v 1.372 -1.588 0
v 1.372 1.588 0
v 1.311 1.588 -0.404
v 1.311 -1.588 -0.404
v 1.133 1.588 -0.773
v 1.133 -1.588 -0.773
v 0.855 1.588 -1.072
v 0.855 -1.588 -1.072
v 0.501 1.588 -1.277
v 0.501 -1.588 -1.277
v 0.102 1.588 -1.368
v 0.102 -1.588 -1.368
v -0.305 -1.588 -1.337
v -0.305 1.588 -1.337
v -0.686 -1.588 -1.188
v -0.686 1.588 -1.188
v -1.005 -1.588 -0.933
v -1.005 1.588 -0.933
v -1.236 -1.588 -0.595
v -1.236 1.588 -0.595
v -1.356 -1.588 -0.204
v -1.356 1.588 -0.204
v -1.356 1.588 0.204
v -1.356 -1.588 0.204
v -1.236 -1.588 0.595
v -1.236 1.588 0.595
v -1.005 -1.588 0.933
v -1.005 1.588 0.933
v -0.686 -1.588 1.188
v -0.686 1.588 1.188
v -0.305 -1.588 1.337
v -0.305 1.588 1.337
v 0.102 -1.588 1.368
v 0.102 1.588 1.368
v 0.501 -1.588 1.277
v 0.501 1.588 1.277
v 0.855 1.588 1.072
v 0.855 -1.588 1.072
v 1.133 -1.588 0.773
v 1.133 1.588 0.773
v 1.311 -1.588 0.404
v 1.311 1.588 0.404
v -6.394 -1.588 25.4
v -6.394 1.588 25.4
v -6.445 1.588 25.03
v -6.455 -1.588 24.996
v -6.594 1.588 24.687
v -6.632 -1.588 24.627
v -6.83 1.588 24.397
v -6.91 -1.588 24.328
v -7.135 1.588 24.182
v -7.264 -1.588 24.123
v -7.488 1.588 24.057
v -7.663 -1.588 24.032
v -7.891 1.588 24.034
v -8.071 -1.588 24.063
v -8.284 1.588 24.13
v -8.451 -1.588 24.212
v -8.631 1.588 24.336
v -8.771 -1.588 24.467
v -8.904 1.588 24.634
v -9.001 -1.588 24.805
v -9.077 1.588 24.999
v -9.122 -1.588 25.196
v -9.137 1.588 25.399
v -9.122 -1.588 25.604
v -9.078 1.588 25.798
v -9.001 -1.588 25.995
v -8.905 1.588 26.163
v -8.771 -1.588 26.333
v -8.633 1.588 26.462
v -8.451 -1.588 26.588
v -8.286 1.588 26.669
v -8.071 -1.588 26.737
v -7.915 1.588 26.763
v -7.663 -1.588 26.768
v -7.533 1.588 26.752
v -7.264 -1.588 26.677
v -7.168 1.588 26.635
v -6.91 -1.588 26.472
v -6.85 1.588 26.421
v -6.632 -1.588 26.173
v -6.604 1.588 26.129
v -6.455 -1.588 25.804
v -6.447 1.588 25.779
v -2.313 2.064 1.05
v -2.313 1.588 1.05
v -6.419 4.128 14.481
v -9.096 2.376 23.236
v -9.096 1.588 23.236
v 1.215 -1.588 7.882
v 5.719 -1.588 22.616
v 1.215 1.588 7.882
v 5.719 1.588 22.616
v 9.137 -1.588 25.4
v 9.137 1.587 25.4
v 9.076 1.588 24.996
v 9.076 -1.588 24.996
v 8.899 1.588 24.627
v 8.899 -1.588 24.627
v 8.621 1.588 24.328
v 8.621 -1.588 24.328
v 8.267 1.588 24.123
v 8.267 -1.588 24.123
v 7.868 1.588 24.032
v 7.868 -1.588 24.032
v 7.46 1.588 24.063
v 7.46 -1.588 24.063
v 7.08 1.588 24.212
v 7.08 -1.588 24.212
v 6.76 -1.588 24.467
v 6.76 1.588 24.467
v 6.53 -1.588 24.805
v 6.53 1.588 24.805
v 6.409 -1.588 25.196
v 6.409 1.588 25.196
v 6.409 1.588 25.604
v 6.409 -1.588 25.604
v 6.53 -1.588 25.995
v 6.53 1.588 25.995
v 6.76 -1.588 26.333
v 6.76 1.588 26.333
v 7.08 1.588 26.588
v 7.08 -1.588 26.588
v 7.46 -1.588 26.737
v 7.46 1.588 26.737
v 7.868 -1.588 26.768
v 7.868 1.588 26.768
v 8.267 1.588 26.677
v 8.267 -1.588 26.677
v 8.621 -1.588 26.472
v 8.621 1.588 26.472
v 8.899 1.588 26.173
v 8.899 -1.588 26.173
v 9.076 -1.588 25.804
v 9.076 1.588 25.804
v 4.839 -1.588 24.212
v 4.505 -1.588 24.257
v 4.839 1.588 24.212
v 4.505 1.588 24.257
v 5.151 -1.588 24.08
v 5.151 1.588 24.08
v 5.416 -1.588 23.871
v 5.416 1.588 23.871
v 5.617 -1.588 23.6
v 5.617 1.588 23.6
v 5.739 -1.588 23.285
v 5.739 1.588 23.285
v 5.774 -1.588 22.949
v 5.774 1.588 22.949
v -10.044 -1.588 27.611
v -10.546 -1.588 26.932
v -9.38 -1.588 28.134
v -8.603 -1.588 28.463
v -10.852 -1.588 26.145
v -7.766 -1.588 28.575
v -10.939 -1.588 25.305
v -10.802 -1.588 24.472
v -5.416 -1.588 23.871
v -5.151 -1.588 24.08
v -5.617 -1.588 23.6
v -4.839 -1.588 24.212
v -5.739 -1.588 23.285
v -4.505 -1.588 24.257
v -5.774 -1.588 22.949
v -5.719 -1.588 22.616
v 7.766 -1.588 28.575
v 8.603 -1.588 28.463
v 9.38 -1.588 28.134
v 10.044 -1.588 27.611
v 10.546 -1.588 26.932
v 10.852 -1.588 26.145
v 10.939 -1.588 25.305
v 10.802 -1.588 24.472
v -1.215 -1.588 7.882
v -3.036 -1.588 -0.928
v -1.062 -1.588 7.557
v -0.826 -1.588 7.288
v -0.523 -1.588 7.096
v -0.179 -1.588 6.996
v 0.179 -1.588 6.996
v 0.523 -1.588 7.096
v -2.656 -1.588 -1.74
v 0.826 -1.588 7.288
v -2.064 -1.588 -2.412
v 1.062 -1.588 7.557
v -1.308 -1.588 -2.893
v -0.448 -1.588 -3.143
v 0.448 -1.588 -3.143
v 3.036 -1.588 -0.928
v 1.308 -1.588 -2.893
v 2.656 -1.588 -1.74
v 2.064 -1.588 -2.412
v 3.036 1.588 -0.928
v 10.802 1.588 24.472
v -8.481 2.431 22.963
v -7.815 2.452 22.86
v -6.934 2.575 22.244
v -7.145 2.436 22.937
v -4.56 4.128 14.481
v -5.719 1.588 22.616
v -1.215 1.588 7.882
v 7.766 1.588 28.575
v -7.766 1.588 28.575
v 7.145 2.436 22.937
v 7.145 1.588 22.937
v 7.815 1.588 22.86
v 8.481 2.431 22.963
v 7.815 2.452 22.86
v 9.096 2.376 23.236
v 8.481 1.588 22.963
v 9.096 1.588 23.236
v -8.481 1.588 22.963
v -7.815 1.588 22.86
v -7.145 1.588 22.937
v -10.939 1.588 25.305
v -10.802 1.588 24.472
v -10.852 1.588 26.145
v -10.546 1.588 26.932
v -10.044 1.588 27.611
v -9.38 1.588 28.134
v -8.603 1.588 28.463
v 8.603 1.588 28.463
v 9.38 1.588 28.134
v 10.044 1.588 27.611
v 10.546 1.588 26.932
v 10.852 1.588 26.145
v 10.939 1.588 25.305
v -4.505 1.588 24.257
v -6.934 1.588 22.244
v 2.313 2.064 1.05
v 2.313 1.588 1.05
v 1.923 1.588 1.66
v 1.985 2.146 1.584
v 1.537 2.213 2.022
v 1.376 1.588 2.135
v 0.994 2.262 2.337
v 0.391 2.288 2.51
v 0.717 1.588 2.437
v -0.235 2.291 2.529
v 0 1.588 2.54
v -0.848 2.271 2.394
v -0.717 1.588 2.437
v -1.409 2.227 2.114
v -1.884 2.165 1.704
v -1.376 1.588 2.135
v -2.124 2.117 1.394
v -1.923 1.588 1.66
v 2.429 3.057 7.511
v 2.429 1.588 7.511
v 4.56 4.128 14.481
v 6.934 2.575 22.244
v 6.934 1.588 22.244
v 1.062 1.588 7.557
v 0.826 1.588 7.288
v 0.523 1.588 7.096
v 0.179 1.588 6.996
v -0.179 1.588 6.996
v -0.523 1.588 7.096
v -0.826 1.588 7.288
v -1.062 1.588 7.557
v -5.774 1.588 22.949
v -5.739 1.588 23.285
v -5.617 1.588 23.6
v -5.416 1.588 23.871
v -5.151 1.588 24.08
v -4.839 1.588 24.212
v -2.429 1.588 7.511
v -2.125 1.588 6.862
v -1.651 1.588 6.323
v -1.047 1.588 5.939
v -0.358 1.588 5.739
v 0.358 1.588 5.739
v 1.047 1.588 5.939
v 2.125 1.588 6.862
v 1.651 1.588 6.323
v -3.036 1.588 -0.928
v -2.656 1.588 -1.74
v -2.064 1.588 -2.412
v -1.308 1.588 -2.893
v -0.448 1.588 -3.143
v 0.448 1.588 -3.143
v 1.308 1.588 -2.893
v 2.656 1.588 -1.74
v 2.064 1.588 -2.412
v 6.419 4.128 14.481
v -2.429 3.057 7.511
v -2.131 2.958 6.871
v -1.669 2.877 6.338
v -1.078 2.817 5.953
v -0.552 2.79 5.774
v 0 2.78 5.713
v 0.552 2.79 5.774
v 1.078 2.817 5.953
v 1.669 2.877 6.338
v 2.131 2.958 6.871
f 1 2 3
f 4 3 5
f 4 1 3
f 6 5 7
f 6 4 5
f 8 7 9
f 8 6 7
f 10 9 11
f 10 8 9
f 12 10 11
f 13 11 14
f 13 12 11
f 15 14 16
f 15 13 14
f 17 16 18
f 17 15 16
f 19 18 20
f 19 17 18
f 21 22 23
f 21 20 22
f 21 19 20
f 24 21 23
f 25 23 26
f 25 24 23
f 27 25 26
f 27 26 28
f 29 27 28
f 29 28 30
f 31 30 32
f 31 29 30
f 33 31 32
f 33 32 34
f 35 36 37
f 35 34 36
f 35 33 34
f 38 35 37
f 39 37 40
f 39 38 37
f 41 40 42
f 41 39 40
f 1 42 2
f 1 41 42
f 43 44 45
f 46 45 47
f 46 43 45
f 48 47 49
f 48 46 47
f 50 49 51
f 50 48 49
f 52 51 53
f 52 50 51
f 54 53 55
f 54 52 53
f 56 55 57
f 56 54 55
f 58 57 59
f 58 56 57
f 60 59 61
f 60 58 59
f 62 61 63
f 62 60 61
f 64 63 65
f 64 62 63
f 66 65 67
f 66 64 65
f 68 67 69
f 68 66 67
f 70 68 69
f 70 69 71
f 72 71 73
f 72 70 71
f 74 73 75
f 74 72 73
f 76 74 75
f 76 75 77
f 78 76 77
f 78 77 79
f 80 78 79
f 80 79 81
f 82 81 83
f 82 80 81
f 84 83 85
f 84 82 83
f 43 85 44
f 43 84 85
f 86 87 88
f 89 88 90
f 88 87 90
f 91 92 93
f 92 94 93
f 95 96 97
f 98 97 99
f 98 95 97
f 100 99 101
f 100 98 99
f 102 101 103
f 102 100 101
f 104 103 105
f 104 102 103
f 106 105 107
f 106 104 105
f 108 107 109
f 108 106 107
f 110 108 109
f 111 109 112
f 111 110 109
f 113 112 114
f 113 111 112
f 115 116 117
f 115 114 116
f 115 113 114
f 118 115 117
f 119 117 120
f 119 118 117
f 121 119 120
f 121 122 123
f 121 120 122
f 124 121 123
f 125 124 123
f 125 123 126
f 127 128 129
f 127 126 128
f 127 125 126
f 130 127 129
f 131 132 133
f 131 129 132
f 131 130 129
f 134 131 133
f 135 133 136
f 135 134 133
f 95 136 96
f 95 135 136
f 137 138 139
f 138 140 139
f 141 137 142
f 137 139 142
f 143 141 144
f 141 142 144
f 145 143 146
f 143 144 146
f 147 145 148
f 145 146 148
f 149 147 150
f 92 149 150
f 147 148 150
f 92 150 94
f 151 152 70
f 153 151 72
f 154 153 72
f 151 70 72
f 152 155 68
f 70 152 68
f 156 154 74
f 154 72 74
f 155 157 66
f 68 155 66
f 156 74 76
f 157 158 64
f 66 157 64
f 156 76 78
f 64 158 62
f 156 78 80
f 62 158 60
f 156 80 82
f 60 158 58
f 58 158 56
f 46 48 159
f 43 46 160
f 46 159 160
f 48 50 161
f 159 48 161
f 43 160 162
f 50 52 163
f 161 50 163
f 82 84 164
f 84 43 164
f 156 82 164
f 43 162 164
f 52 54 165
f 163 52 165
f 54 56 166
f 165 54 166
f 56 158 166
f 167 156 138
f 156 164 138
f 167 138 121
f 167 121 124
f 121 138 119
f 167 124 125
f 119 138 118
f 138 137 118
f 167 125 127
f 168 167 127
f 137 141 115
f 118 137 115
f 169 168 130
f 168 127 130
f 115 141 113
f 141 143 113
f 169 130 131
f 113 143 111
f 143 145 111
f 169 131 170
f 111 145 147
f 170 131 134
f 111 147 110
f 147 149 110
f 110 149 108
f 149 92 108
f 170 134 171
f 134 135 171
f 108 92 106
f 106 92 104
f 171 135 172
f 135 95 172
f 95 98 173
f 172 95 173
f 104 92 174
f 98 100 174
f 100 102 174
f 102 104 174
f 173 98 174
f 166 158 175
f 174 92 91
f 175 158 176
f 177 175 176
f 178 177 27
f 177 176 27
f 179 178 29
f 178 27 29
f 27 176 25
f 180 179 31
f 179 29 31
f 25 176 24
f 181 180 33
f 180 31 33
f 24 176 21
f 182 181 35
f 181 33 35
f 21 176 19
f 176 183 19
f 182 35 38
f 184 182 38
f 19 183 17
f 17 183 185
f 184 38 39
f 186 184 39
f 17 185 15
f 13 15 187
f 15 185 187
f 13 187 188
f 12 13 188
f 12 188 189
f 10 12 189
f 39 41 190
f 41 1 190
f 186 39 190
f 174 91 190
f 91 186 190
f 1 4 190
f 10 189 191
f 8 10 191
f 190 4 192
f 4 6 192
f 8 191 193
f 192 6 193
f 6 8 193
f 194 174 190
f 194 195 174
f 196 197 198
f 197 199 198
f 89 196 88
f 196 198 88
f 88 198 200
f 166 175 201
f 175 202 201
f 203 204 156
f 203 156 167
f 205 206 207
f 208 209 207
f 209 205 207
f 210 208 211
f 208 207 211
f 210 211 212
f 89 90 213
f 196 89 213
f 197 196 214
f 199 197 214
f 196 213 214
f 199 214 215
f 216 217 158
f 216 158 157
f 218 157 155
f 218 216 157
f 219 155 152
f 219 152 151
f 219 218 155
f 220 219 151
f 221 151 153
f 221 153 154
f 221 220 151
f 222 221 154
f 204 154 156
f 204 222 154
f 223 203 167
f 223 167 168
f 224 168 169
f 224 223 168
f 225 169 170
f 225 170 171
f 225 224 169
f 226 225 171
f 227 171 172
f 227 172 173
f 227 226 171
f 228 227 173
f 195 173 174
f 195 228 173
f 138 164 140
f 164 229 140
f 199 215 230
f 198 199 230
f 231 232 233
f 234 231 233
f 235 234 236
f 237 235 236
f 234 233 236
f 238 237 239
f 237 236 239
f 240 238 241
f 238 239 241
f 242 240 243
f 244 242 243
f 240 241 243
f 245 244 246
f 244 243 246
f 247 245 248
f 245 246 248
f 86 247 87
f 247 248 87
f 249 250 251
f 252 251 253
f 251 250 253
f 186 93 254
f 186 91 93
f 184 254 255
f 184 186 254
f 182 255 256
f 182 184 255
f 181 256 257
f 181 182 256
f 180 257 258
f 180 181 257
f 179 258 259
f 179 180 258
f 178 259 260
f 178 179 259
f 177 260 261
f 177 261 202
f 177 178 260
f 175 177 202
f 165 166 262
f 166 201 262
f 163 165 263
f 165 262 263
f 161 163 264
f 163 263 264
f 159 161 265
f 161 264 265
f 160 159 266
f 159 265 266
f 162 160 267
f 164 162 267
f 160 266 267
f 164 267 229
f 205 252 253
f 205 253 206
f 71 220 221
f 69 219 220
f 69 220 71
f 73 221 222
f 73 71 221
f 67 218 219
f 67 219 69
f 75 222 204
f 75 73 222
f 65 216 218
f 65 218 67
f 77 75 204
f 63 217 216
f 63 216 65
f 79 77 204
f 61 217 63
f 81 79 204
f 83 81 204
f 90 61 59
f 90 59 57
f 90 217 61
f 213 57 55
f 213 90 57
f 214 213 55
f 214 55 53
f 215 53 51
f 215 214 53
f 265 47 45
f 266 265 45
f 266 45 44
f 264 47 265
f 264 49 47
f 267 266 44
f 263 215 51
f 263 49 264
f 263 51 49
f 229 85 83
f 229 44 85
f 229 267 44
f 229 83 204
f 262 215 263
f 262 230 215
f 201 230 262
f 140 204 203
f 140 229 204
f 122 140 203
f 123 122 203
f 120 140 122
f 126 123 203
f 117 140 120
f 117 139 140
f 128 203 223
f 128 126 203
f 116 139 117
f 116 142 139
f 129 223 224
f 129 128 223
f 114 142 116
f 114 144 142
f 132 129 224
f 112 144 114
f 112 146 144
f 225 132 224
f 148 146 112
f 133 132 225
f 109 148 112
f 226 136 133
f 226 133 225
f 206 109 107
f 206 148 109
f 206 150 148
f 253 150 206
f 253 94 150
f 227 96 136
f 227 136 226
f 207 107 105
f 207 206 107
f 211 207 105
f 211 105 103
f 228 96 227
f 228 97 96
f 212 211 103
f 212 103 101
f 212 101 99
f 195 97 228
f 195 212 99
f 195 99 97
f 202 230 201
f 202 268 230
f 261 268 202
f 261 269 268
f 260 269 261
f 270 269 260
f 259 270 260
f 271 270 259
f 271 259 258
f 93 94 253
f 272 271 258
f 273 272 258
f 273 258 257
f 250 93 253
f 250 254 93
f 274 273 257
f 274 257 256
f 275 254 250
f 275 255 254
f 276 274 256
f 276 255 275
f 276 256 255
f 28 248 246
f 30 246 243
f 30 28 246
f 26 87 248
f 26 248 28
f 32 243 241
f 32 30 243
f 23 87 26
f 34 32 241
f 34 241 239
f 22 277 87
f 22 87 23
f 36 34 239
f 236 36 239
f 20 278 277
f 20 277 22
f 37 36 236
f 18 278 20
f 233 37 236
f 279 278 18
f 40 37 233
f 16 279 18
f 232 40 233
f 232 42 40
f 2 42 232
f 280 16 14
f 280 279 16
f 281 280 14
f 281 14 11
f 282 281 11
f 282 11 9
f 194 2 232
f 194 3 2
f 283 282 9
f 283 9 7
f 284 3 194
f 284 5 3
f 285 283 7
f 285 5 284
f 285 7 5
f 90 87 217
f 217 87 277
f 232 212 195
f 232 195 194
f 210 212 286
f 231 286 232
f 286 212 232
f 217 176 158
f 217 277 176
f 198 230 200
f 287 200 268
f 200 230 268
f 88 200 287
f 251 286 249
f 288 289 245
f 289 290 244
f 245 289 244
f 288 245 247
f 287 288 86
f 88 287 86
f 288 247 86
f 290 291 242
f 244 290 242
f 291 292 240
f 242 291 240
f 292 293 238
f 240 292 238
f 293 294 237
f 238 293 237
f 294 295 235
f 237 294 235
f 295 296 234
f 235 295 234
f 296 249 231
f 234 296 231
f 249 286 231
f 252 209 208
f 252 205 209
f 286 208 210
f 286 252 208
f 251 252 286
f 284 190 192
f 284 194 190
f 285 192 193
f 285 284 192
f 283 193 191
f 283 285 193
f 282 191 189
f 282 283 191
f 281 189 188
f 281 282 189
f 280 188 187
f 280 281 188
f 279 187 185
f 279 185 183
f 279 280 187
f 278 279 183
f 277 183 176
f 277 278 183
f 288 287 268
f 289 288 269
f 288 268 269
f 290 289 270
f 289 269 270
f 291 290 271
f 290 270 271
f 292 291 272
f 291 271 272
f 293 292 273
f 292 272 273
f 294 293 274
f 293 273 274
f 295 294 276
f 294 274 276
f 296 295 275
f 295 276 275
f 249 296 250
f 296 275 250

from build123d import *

# Parameters (mm, degrees)
SKETCH1_R        = 1.3716
BODY_DEPTH       = 1.5875
SKETCH2_R        = 1.3716
RIB_DEPTH        = 3.175
ANGLE_DEPTH      = 11.940559309
ANGLE_DEPTH_BACK = 11.940559309
BOLT_START       = -3.175
SKETCH5_R        = 2.54
BOLT_HOLE_DEPTH  = 2.54


with BuildPart() as part:
    # Sketch1 → Body (new body, symmetric)
    with BuildSketch(Plane(origin=(0, 0, 0), x_dir=(1, 0, 0), z_dir=(0, 1, 0))):
        with BuildLine():
            Line((-3.0362676, 0.928280162), (-10.801826909, -24.471719838))
            ThreePointArc((-10.801826909, -24.471719838), (-10.317804842, -27.288562348), (-7.765559309, -28.575))
            Line((-7.765559309, -28.575), (7.765559309, -28.575))
            ThreePointArc((7.765559309, -28.575), (10.317804842, -27.288562348), (10.801826909, -24.471719838))
            Line((10.801826909, -24.471719838), (3.0362676, 0.928280162))
            ThreePointArc((3.0362676, 0.928280162), (0, 3.175), (-3.0362676, 0.928280162))
        make_face()
        Circle(SKETCH1_R, mode=Mode.SUBTRACT)
        with Locations((-7.765559309, -25.4)):
            Circle(SKETCH1_R, mode=Mode.SUBTRACT)
        with Locations((7.765559309, -25.4)):
            Circle(SKETCH1_R, mode=Mode.SUBTRACT)
        with BuildLine():
            Line((-1.21450704, -7.88188057), (-5.719084006, -22.615687935))
            ThreePointArc((-5.719084006, -22.615687935), (-5.525475179, -23.742424939), (-4.504576966, -24.257))
            Line((-4.504576966, -24.257), (4.504576966, -24.257))
            ThreePointArc((4.504576966, -24.257), (5.525475179, -23.742424939), (5.719084006, -22.615687935))
            Line((5.719084006, -22.615687935), (1.21450704, -7.88188057))
            ThreePointArc((1.21450704, -7.88188057), (0, -6.983192635), (-1.21450704, -7.88188057))
        make_face(mode=Mode.SUBTRACT)
    extrude(amount=BODY_DEPTH, both=True)

    # Sketch2 → Rib (add)
    with BuildSketch(Plane(origin=(0, 1.5875, 0), x_dir=(1, 0, 0), z_dir=(0, 1, 0))):
        with BuildLine():
            Line((-7.487715721, -24.056836011), (-6.933591046, -22.24437587))
            Line((-6.933591046, -22.24437587), (-2.42901408, -7.510568505))
            ThreePointArc((-2.42901408, -7.510568505), (0, -5.713192635), (2.42901408, -7.510568505))
            Line((2.42901408, -7.510568505), (6.933591046, -22.24437587))
            Line((6.933591046, -22.24437587), (7.487715721, -24.056836011))
            ThreePointArc((7.487715721, -24.056836011), (8.631641376, -24.336426583), (9.137159309, -25.4))
            ThreePointArc((9.137159309, -25.4), (8.904756482, -26.163882426), (8.286304306, -26.668901576))
            Line((8.286304306, -26.668901576), (8.442739025, -27.180576489))
            ThreePointArc((8.442739025, -27.180576489), (9.476466758, -26.237747397), (9.587319869, -24.843031903))
            Line((9.587319869, -24.843031903), (1.82176056, 0.556968097))
            ThreePointArc((1.82176056, 0.556968097), (0, 1.905), (-1.82176056, 0.556968097))
            Line((-1.82176056, 0.556968097), (-9.587319869, -24.843031903))
            ThreePointArc((-9.587319869, -24.843031903), (-9.476466758, -26.237747397), (-8.442739025, -27.180576489))
            Line((-8.442739025, -27.180576489), (-8.286304306, -26.668901576))
            ThreePointArc((-8.286304306, -26.668901576), (-9.077226912, -24.99898297), (-7.487715721, -24.056836011))
        make_face()
        Circle(SKETCH2_R, mode=Mode.SUBTRACT)
    extrude(amount=RIB_DEPTH)

    # Sketch6 → Angle (cut, two sides)
    with BuildSketch(Plane(origin=(0, 0, 0), x_dir=(0, 0, -1), z_dir=(1, 0, 0))) as angle_sk:
        Polygon((-14.480576489, 4.1275), (2.051640081, 1.5875), (2.051640081, 8.789734229), (-27.180576489, 8.789734229), (-27.180576489, 1.5875), align=None)
    extrude(amount=ANGLE_DEPTH, mode=Mode.SUBTRACT)
    extrude(angle_sk.sketch, amount=-ANGLE_DEPTH_BACK, mode=Mode.SUBTRACT)

    # Sketch5 → Bolt hole (cut)
    with BuildSketch(Plane.XZ.offset(1.5875).offset(BOLT_START)):
        Circle(SKETCH5_R)
        with Locations((7.765559309, 25.4)):
            Circle(SKETCH5_R)
        with Locations((-7.765559309, 25.4)):
            Circle(SKETCH5_R)
    extrude(amount=-BOLT_HOLE_DEPTH, mode=Mode.SUBTRACT)


solid = part.part
